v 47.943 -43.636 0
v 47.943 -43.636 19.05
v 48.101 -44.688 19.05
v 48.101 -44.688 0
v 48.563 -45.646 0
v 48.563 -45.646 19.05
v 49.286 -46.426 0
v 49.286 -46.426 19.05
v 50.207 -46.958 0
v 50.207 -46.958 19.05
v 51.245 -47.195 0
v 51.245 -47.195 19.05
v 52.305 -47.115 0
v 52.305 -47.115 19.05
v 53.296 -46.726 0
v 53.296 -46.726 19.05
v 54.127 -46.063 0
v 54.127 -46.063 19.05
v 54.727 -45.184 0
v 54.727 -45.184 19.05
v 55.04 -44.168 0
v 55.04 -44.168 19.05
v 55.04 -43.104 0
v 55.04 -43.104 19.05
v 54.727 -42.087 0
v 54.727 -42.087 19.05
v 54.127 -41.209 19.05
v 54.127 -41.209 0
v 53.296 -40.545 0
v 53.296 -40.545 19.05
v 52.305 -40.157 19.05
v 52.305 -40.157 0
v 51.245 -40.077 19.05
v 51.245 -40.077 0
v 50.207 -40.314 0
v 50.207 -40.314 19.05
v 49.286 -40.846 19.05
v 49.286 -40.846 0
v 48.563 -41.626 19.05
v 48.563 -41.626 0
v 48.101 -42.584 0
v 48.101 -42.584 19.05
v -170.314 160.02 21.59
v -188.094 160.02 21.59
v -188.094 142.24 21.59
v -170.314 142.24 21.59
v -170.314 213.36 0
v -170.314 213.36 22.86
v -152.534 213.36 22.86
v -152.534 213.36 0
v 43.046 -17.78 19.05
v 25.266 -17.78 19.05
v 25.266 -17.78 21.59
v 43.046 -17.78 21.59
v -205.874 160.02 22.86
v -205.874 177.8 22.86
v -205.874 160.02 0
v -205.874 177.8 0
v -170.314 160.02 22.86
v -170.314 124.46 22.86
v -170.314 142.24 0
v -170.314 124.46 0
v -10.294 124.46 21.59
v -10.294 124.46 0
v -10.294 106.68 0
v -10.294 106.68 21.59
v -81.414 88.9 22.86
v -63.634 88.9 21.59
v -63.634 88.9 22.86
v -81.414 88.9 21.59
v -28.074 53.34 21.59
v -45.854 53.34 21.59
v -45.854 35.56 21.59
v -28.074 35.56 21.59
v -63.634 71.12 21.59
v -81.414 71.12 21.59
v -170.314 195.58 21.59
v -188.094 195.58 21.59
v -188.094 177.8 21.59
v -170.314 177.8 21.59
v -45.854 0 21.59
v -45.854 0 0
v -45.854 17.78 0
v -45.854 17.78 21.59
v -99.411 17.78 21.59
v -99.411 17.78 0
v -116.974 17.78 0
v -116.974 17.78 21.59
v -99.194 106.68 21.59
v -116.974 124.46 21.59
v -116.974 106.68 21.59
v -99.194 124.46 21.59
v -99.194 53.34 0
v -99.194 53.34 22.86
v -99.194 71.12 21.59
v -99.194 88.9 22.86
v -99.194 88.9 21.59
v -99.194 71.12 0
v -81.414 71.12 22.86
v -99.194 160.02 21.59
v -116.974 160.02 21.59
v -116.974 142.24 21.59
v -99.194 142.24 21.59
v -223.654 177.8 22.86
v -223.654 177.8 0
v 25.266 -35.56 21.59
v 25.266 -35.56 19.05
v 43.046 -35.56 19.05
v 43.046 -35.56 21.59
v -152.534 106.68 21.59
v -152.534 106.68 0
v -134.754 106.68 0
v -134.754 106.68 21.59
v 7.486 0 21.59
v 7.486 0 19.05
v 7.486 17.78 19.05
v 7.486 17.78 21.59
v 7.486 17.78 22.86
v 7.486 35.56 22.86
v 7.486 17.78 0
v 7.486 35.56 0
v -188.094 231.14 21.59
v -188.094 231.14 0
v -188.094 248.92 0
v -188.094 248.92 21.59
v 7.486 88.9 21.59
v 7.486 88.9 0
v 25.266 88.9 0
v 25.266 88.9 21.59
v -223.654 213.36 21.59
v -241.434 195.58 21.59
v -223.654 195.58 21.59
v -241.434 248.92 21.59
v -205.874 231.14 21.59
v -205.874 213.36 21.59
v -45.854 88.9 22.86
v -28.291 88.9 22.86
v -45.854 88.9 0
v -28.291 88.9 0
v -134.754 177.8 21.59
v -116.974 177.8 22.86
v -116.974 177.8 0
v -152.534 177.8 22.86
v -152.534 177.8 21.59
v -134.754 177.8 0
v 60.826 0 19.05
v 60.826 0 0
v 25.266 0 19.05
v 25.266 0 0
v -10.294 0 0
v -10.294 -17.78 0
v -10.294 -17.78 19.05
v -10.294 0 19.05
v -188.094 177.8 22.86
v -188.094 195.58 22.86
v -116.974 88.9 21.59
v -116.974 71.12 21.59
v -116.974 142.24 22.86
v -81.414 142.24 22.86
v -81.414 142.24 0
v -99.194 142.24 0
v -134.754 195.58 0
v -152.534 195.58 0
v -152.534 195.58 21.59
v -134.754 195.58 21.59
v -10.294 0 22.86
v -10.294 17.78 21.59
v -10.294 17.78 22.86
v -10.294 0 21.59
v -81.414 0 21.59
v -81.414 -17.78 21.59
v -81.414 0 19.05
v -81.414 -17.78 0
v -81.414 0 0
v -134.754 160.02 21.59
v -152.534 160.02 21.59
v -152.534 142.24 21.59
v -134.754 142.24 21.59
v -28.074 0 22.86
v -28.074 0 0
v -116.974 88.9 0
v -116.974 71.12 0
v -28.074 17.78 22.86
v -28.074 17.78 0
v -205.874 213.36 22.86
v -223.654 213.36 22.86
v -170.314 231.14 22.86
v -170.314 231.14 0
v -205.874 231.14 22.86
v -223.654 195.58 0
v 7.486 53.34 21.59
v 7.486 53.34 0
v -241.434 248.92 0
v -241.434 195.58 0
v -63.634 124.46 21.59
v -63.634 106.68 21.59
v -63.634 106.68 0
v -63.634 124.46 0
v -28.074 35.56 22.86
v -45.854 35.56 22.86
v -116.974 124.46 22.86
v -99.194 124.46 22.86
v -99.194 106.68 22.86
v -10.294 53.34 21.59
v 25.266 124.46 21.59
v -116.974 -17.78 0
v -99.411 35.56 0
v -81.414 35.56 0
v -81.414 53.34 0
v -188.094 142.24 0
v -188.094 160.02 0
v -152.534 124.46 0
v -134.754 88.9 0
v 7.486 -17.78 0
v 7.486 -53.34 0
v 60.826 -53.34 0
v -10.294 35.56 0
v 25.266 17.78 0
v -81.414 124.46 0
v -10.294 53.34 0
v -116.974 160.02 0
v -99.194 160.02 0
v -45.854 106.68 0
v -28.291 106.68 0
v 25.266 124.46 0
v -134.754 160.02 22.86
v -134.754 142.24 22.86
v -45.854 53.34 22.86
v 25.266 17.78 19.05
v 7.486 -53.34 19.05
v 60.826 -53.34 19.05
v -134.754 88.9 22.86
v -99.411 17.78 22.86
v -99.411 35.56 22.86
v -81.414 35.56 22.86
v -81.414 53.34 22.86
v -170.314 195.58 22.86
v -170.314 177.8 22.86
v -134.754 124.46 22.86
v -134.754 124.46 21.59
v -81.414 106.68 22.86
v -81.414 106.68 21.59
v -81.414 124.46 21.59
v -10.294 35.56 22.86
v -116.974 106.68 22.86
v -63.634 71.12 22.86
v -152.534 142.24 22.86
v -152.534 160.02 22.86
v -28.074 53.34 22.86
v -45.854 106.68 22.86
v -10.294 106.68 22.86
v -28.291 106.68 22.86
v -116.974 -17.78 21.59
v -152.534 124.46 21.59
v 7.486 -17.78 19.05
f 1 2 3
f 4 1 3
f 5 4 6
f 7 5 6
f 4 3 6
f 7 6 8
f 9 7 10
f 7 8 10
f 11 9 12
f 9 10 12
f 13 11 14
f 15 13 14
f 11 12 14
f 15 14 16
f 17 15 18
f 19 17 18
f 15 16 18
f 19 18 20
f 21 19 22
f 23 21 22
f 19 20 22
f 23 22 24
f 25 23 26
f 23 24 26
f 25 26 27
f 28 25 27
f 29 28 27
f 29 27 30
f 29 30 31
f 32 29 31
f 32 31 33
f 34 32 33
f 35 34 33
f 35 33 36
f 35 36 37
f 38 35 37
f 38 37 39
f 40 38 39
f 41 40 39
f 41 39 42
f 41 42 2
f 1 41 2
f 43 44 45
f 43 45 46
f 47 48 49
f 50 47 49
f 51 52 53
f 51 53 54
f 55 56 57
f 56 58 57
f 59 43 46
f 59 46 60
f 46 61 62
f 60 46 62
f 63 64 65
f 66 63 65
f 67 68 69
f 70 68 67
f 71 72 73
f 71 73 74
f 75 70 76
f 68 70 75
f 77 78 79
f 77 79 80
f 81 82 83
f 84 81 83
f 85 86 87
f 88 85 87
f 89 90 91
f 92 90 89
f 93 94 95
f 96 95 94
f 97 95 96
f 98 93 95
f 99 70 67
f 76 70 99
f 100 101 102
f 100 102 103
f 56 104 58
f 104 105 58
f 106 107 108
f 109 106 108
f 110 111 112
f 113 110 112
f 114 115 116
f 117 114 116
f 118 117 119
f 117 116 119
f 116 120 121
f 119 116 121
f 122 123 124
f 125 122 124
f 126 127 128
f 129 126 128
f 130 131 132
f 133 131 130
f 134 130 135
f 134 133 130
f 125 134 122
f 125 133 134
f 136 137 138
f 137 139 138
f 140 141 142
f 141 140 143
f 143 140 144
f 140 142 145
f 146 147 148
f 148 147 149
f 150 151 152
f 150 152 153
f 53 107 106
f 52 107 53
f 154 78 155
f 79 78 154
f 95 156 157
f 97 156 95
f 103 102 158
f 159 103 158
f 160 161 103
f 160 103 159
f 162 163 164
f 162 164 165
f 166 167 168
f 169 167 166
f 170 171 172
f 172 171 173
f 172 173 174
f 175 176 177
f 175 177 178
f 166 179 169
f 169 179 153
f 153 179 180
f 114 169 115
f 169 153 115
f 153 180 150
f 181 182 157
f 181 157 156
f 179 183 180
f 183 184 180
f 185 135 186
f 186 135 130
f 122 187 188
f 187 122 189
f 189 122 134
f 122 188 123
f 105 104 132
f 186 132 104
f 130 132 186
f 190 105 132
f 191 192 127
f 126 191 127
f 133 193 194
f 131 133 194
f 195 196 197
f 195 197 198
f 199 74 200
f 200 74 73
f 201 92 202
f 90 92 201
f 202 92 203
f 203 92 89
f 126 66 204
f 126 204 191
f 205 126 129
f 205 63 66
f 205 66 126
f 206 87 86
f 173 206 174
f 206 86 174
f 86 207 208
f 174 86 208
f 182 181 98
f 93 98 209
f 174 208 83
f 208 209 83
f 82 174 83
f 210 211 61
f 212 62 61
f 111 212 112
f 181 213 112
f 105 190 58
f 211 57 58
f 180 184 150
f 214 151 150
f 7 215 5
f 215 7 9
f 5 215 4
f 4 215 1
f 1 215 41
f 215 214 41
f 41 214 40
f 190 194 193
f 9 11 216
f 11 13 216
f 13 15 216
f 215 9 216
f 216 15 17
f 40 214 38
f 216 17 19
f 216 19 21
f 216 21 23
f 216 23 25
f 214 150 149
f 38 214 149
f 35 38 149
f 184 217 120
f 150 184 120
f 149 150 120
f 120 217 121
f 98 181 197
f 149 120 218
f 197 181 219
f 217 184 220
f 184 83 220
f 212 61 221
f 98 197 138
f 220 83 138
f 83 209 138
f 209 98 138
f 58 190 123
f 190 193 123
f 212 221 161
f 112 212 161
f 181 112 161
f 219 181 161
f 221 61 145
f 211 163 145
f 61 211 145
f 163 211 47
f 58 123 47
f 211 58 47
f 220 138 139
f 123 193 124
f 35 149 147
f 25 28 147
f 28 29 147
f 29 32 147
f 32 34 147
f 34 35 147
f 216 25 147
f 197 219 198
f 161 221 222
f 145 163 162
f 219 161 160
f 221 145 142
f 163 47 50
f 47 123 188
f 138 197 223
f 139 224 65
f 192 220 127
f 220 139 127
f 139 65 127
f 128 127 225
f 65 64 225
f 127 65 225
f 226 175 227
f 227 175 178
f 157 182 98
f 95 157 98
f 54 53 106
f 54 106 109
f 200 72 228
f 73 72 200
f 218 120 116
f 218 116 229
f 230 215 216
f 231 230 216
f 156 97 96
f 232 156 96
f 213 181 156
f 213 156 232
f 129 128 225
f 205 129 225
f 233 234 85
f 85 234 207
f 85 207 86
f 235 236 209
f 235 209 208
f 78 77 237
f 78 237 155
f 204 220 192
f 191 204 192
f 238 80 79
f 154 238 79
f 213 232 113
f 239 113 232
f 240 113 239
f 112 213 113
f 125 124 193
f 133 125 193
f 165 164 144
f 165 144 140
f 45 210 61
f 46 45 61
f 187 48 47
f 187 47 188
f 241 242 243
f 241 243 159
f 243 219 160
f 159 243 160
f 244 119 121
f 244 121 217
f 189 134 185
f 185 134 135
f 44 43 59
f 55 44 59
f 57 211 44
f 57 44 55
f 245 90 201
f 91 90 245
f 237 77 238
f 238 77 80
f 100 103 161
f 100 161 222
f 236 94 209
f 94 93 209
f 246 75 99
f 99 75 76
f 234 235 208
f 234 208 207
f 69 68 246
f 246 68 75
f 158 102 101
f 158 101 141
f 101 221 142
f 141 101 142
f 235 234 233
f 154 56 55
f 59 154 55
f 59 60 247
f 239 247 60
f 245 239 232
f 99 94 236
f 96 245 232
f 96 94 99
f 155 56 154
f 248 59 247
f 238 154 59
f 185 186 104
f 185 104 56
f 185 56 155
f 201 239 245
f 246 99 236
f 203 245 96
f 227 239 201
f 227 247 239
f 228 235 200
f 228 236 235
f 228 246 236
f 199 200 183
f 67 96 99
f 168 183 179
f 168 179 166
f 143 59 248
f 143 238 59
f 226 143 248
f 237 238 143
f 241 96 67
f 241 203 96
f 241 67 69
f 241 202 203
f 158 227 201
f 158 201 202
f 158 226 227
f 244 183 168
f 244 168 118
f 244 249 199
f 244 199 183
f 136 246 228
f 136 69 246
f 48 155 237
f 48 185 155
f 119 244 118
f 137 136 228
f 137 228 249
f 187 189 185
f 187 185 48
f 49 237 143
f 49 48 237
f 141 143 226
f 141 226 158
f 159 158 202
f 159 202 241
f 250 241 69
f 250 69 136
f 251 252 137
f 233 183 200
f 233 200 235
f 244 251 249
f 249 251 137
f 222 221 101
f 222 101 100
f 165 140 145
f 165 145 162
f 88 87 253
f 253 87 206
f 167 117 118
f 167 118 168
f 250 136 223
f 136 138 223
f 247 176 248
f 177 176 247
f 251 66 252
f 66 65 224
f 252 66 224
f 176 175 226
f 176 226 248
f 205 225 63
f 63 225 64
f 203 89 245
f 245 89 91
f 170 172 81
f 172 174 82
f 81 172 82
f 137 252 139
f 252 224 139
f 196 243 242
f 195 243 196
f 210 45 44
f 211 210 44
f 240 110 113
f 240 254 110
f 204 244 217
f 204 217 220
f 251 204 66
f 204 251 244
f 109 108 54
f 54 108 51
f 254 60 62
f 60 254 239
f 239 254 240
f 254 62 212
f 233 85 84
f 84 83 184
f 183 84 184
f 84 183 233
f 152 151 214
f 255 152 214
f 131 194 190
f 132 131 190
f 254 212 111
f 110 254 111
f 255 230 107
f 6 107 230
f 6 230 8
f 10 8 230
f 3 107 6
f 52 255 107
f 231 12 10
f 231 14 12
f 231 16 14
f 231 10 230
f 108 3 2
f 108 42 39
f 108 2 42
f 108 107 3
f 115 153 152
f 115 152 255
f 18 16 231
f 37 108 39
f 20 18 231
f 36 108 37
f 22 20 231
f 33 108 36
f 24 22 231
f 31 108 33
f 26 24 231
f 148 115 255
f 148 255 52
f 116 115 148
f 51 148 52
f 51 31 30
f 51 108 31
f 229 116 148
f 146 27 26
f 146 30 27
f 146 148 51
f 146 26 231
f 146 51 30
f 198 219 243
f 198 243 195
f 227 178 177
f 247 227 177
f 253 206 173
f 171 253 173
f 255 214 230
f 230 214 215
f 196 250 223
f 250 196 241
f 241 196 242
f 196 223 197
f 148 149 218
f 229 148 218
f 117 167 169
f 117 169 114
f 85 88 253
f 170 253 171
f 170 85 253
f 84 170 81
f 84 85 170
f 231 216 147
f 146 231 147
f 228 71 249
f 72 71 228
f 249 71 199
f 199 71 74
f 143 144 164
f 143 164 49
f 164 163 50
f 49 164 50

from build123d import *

# Parameters (mm, degrees)
F0_W     = 17.78
F0_H     = 17.78
F0_W_2   = 35.56
F0_W_3   = 17.9974469995
F0_H_2   = 35.56
F1_DEPTH = 19.05
F2_DEPTH = 21.59
F3_DEPTH = 3.81
F4_D     = 7.1374


with BuildPart() as f1:
    # F0 (on Top) → F1 (new body)
    with BuildSketch(Plane.XY):
        Polygon((-134.7540525866, 124.46), (-134.7540525866, 124.2569237947), (-117.5547838211, 124.2569237947), (-117.5547838211, 142.24), (-134.7540525866, 142.24), align=None)
        with Locations((-161.4240525866, 151.13)):
            Rectangle(F0_W, F0_H)
        with Locations((-63.6340525866, 26.67)):
            Rectangle(F0_W_2, F0_H)
        with Locations((-179.2040525866, 168.91)):
            Rectangle(F0_W, F0_H)
        with Locations((-90.3040525866, 133.35)):
            Rectangle(F0_W, F0_H)
        Polygon((-10.2940525866, 106.68), (-10.2940525866, 88.9), (7.4859474134, 88.9), (7.4859474134, 106.7038958168), (-10.2940525866, 106.7038958168), align=None)
        with Locations((-72.5240525866, 97.79)):
            Rectangle(F0_W, F0_H)
        with Locations((16.3759474134, -8.89)):
            Rectangle(F0_W, F0_H)
        with Locations((-90.4127760863, 26.67)):
            Rectangle(F0_W_3, F0_H)
        with Locations((-72.5240525866, 115.57)):
            Rectangle(F0_W, F0_H)
        with Locations((-19.1840525866, 44.45)):
            Rectangle(F0_W, F0_H)
        with Locations((-143.6440525866, 151.13)):
            Rectangle(F0_W, F0_H)
        with Locations((-143.6440525866, 186.69)):
            Rectangle(F0_W, F0_H)
        with Locations((-108.0840525866, 151.13)):
            Rectangle(F0_W, F0_H)
        with Locations((-1.4040525866, -8.89)):
            Rectangle(F0_W, F0_H)
        Polygon((60.8259474134, 0), (25.2659474134, 0), (25.2659474134, -17.78), (7.4859474134, -17.78), (7.4859474134, -53.34), (60.8259474134, -53.34), align=None)
        with Locations((34.1559474134, -26.67)):
            Rectangle(F0_W, F0_H, mode=Mode.SUBTRACT)
        with Locations((-161.4240525866, 133.35)):
            Rectangle(F0_W, F0_H)
        with Locations((-108.0840525866, 115.57)):
            Rectangle(F0_W, F0_H)
        Polygon((-28.0740525866, 0), (-10.2940525866, 0), (-10.2940525866, 17.78), (7.4859474134, 17.78), (7.4859474134, 35.56), (-10.1443827152, 35.56), (-10.1443827152, 17.9467629641), (-28.0740525866, 17.9467629641), (-28.0740525866, 17.78), align=None)
        with Locations((-90.3040525866, 62.23)):
            Rectangle(F0_W, F0_H)
        with Locations((-161.4240525866, 204.47)):
            Rectangle(F0_W, F0_H)
        Polygon((-10.1443827152, 17.9467629641), (-10.1443827152, 35.56), (-10.2940525866, 35.56), (-28.0740525866, 35.56), (-28.0740525866, 17.9467629641), align=None)
        with Locations((-54.7440525866, 80.01)):
            Rectangle(F0_W, F0_H)
        with Locations((-196.9840525866, 168.91)):
            Rectangle(F0_W, F0_H)
        with Locations((-143.6440525866, 168.91)):
            Rectangle(F0_W, F0_H)
        with Locations((-108.0840525866, 80.01)):
            Rectangle(F0_W, F0_H)
        with Locations((-161.4240525866, 168.91)):
            Rectangle(F0_W, F0_H)
        with Locations((-179.2040525866, 186.69)):
            Rectangle(F0_W, F0_H)
        with Locations((-143.6440525866, 133.35)):
            Rectangle(F0_W, F0_H)
        with Locations((-90.4127760863, 8.89)):
            Rectangle(F0_W_3, F0_H)
        Polygon((-45.8540525866, 17.78), (-28.0740525866, 17.78), (-28.0740525866, 17.9467629641), (-28.0740525866, 35.56), (-45.8540525866, 35.56), align=None)
        with Locations((-54.7440525866, 97.79)):
            Rectangle(F0_W, F0_H)
        with Locations((-72.5240525866, 62.23)):
            Rectangle(F0_W, F0_H)
        with Locations((-196.9840525866, 204.47)):
            Rectangle(F0_W, F0_H)
        with Locations((34.1559474134, -26.67)):
            Rectangle(F0_W, F0_H)
        with Locations((-63.6340525866, 8.89)):
            Rectangle(F0_W_2, F0_H)
        with Locations((-214.7640525866, 222.25)):
            Rectangle(F0_W, F0_H)
        with Locations((-72.5240525866, 80.01)):
            Rectangle(F0_W, F0_H)
        with Locations((-179.2040525866, 222.25)):
            Rectangle(F0_W, F0_H)
        Polygon((-152.5340525866, 106.68), (-134.7540525866, 106.68), (-134.7540525866, 124.2569237947), (-134.7540525866, 124.46), (-152.5340525866, 124.46), align=None)
        with Locations((-161.4240525866, 186.69)):
            Rectangle(F0_W, F0_H)
        with Locations((-1.4040525866, 71.12)):
            Rectangle(F0_W, F0_H_2)
        with Locations((-125.8640525866, 97.79)):
            Rectangle(F0_W, F0_H)
        with Locations((-90.3040525866, 115.57)):
            Rectangle(F0_W, F0_H)
        with Locations((-1.4040525866, 8.89)):
            Rectangle(F0_W, F0_H)
        with Locations((-90.3040525866, 97.79)):
            Rectangle(F0_W, F0_H)
        Polygon((-99.4114995861, 0), (-99.4114995861, 17.78), (-116.9740525866, 17.78), (-116.9740525866, -17.78), (-81.4140525866, -17.78), (-81.4140525866, 0), align=None)
        Polygon((-28.0740525866, 88.9), (-10.2940525866, 88.9), (-10.2940525866, 106.68), (-28.2914995861, 106.68), (-28.2914995861, 88.9), align=None)
        with Locations((-196.9840525866, 222.25)):
            Rectangle(F0_W, F0_H)
        with Locations((-125.8640525866, 168.91)):
            Rectangle(F0_W, F0_H)
        Polygon((-241.4340525866, 195.58), (-223.6540525866, 195.58), (-223.6540525866, 213.36), (-223.6540525866, 231.14), (-205.8740525866, 231.14), (-188.0940525866, 231.14), (-188.0940525866, 248.92), (-223.6540525866, 248.92), (-241.4340525866, 248.92), (-241.4340525866, 231.14), align=None)
        with Locations((-90.3040525866, 80.01)):
            Rectangle(F0_W, F0_H)
        with Locations((-214.7640525866, 204.47)):
            Rectangle(F0_W, F0_H)
        with Locations((-179.2040525866, 204.47)):
            Rectangle(F0_W, F0_H)
        with Locations((-108.0840525866, 97.79)):
            Rectangle(F0_W, F0_H)
        with Locations((-179.2040525866, 151.13)):
            Rectangle(F0_W, F0_H)
        Polygon((7.4859474134, 106.7038958168), (7.4859474134, 88.9), (25.2659474134, 88.9), (25.2659474134, 124.46), (-10.2940525866, 124.46), (-10.2940525866, 106.7038958168), align=None)
        with Locations((-54.7440525866, 62.23)):
            Rectangle(F0_W, F0_H)
        with Locations((-196.9840525866, 186.69)):
            Rectangle(F0_W, F0_H)
        with Locations((-36.9640525866, 44.45)):
            Rectangle(F0_W, F0_H)
        Polygon((-81.4140525866, 35.56), (-45.8540525866, 35.56), (-45.8540525866, 53.34), (-63.6340525866, 53.34), (-81.4140525866, 53.34), align=None)
        Polygon((-45.8540525866, 53.34), (-28.0740525866, 53.34), (-28.0740525866, 88.9), (-28.2914995861, 88.9), (-45.8540525866, 88.9), (-45.8540525866, 71.12), align=None)
        with Locations((-19.1840525866, 71.12)):
            Rectangle(F0_W, F0_H_2)
        Polygon((-117.5547838211, 142.24), (-116.9740525866, 142.24), (-116.9740525866, 160.02), (-134.7540525866, 160.02), (-134.7540525866, 142.24), align=None)
        Polygon((-134.7540525866, 106.68), (-116.9740525866, 106.68), (-116.9740525866, 124.46), (-99.1940525866, 124.46), (-99.1940525866, 142.24), (-116.9740525866, 142.24), (-117.5547838211, 142.24), (-117.5547838211, 124.2569237947), (-134.7540525866, 124.2569237947), align=None)
        with Locations((16.3759474134, 8.89)):
            Rectangle(F0_W, F0_H)
        with Locations((-214.7640525866, 186.69)):
            Rectangle(F0_W, F0_H)
    extrude(amount=F1_DEPTH)

    # F0 (on Top) → F2 (join)
    with BuildSketch(Plane.XY):
        with Locations((34.1559474134, -26.67)):
            Rectangle(F0_W, F0_H)
        with Locations((-1.4040525866, 8.89)):
            Rectangle(F0_W, F0_H)
        with Locations((-36.9640525866, 44.45)):
            Rectangle(F0_W, F0_H)
        Polygon((-10.2940525866, 106.68), (-10.2940525866, 88.9), (7.4859474134, 88.9), (7.4859474134, 106.7038958168), (-10.2940525866, 106.7038958168), align=None)
        Polygon((7.4859474134, 106.7038958168), (7.4859474134, 88.9), (25.2659474134, 88.9), (25.2659474134, 124.46), (-10.2940525866, 124.46), (-10.2940525866, 106.7038958168), align=None)
        with Locations((-1.4040525866, 71.12)):
            Rectangle(F0_W, F0_H_2)
        with Locations((-63.6340525866, 8.89)):
            Rectangle(F0_W_2, F0_H)
        Polygon((-99.4114995861, 0), (-99.4114995861, 17.78), (-116.9740525866, 17.78), (-116.9740525866, -17.78), (-81.4140525866, -17.78), (-81.4140525866, 0), align=None)
        with Locations((-90.4127760863, 8.89)):
            Rectangle(F0_W_3, F0_H)
        with Locations((-72.5240525866, 80.01)):
            Rectangle(F0_W, F0_H)
        with Locations((-108.0840525866, 115.57)):
            Rectangle(F0_W, F0_H)
        with Locations((-143.6440525866, 151.13)):
            Rectangle(F0_W, F0_H)
        with Locations((-179.2040525866, 186.69)):
            Rectangle(F0_W, F0_H)
        with Locations((-214.7640525866, 222.25)):
            Rectangle(F0_W, F0_H)
        Polygon((-241.4340525866, 195.58), (-223.6540525866, 195.58), (-223.6540525866, 213.36), (-223.6540525866, 231.14), (-205.8740525866, 231.14), (-188.0940525866, 231.14), (-188.0940525866, 248.92), (-223.6540525866, 248.92), (-241.4340525866, 248.92), (-241.4340525866, 231.14), align=None)
        with Locations((-143.6440525866, 186.69)):
            Rectangle(F0_W, F0_H)
        with Locations((-179.2040525866, 151.13)):
            Rectangle(F0_W, F0_H)
        with Locations((-108.0840525866, 151.13)):
            Rectangle(F0_W, F0_H)
        Polygon((-152.5340525866, 106.68), (-134.7540525866, 106.68), (-134.7540525866, 124.2569237947), (-134.7540525866, 124.46), (-152.5340525866, 124.46), align=None)
        with Locations((-72.5240525866, 115.57)):
            Rectangle(F0_W, F0_H)
        with Locations((-108.0840525866, 80.01)):
            Rectangle(F0_W, F0_H)
    extrude(amount=F2_DEPTH)

    # F3 (add): a face of the model
    f3_faces = [f1.faces().sort_by_distance(p)[0] for p in [
        (-90.3040525866, 138.9711867719, 19.05),
    ]]
    extrude(f3_faces, amount=F3_DEPTH)

    # F4 (through all)
    with Locations(Plane(origin=(0, 0, 0), x_dir=(1, 0, 0), z_dir=(0, 0, -1))):
        with Locations((51.5112578869, 43.6358898878)):
            Hole(F4_D / 2)


solid = f1.part
